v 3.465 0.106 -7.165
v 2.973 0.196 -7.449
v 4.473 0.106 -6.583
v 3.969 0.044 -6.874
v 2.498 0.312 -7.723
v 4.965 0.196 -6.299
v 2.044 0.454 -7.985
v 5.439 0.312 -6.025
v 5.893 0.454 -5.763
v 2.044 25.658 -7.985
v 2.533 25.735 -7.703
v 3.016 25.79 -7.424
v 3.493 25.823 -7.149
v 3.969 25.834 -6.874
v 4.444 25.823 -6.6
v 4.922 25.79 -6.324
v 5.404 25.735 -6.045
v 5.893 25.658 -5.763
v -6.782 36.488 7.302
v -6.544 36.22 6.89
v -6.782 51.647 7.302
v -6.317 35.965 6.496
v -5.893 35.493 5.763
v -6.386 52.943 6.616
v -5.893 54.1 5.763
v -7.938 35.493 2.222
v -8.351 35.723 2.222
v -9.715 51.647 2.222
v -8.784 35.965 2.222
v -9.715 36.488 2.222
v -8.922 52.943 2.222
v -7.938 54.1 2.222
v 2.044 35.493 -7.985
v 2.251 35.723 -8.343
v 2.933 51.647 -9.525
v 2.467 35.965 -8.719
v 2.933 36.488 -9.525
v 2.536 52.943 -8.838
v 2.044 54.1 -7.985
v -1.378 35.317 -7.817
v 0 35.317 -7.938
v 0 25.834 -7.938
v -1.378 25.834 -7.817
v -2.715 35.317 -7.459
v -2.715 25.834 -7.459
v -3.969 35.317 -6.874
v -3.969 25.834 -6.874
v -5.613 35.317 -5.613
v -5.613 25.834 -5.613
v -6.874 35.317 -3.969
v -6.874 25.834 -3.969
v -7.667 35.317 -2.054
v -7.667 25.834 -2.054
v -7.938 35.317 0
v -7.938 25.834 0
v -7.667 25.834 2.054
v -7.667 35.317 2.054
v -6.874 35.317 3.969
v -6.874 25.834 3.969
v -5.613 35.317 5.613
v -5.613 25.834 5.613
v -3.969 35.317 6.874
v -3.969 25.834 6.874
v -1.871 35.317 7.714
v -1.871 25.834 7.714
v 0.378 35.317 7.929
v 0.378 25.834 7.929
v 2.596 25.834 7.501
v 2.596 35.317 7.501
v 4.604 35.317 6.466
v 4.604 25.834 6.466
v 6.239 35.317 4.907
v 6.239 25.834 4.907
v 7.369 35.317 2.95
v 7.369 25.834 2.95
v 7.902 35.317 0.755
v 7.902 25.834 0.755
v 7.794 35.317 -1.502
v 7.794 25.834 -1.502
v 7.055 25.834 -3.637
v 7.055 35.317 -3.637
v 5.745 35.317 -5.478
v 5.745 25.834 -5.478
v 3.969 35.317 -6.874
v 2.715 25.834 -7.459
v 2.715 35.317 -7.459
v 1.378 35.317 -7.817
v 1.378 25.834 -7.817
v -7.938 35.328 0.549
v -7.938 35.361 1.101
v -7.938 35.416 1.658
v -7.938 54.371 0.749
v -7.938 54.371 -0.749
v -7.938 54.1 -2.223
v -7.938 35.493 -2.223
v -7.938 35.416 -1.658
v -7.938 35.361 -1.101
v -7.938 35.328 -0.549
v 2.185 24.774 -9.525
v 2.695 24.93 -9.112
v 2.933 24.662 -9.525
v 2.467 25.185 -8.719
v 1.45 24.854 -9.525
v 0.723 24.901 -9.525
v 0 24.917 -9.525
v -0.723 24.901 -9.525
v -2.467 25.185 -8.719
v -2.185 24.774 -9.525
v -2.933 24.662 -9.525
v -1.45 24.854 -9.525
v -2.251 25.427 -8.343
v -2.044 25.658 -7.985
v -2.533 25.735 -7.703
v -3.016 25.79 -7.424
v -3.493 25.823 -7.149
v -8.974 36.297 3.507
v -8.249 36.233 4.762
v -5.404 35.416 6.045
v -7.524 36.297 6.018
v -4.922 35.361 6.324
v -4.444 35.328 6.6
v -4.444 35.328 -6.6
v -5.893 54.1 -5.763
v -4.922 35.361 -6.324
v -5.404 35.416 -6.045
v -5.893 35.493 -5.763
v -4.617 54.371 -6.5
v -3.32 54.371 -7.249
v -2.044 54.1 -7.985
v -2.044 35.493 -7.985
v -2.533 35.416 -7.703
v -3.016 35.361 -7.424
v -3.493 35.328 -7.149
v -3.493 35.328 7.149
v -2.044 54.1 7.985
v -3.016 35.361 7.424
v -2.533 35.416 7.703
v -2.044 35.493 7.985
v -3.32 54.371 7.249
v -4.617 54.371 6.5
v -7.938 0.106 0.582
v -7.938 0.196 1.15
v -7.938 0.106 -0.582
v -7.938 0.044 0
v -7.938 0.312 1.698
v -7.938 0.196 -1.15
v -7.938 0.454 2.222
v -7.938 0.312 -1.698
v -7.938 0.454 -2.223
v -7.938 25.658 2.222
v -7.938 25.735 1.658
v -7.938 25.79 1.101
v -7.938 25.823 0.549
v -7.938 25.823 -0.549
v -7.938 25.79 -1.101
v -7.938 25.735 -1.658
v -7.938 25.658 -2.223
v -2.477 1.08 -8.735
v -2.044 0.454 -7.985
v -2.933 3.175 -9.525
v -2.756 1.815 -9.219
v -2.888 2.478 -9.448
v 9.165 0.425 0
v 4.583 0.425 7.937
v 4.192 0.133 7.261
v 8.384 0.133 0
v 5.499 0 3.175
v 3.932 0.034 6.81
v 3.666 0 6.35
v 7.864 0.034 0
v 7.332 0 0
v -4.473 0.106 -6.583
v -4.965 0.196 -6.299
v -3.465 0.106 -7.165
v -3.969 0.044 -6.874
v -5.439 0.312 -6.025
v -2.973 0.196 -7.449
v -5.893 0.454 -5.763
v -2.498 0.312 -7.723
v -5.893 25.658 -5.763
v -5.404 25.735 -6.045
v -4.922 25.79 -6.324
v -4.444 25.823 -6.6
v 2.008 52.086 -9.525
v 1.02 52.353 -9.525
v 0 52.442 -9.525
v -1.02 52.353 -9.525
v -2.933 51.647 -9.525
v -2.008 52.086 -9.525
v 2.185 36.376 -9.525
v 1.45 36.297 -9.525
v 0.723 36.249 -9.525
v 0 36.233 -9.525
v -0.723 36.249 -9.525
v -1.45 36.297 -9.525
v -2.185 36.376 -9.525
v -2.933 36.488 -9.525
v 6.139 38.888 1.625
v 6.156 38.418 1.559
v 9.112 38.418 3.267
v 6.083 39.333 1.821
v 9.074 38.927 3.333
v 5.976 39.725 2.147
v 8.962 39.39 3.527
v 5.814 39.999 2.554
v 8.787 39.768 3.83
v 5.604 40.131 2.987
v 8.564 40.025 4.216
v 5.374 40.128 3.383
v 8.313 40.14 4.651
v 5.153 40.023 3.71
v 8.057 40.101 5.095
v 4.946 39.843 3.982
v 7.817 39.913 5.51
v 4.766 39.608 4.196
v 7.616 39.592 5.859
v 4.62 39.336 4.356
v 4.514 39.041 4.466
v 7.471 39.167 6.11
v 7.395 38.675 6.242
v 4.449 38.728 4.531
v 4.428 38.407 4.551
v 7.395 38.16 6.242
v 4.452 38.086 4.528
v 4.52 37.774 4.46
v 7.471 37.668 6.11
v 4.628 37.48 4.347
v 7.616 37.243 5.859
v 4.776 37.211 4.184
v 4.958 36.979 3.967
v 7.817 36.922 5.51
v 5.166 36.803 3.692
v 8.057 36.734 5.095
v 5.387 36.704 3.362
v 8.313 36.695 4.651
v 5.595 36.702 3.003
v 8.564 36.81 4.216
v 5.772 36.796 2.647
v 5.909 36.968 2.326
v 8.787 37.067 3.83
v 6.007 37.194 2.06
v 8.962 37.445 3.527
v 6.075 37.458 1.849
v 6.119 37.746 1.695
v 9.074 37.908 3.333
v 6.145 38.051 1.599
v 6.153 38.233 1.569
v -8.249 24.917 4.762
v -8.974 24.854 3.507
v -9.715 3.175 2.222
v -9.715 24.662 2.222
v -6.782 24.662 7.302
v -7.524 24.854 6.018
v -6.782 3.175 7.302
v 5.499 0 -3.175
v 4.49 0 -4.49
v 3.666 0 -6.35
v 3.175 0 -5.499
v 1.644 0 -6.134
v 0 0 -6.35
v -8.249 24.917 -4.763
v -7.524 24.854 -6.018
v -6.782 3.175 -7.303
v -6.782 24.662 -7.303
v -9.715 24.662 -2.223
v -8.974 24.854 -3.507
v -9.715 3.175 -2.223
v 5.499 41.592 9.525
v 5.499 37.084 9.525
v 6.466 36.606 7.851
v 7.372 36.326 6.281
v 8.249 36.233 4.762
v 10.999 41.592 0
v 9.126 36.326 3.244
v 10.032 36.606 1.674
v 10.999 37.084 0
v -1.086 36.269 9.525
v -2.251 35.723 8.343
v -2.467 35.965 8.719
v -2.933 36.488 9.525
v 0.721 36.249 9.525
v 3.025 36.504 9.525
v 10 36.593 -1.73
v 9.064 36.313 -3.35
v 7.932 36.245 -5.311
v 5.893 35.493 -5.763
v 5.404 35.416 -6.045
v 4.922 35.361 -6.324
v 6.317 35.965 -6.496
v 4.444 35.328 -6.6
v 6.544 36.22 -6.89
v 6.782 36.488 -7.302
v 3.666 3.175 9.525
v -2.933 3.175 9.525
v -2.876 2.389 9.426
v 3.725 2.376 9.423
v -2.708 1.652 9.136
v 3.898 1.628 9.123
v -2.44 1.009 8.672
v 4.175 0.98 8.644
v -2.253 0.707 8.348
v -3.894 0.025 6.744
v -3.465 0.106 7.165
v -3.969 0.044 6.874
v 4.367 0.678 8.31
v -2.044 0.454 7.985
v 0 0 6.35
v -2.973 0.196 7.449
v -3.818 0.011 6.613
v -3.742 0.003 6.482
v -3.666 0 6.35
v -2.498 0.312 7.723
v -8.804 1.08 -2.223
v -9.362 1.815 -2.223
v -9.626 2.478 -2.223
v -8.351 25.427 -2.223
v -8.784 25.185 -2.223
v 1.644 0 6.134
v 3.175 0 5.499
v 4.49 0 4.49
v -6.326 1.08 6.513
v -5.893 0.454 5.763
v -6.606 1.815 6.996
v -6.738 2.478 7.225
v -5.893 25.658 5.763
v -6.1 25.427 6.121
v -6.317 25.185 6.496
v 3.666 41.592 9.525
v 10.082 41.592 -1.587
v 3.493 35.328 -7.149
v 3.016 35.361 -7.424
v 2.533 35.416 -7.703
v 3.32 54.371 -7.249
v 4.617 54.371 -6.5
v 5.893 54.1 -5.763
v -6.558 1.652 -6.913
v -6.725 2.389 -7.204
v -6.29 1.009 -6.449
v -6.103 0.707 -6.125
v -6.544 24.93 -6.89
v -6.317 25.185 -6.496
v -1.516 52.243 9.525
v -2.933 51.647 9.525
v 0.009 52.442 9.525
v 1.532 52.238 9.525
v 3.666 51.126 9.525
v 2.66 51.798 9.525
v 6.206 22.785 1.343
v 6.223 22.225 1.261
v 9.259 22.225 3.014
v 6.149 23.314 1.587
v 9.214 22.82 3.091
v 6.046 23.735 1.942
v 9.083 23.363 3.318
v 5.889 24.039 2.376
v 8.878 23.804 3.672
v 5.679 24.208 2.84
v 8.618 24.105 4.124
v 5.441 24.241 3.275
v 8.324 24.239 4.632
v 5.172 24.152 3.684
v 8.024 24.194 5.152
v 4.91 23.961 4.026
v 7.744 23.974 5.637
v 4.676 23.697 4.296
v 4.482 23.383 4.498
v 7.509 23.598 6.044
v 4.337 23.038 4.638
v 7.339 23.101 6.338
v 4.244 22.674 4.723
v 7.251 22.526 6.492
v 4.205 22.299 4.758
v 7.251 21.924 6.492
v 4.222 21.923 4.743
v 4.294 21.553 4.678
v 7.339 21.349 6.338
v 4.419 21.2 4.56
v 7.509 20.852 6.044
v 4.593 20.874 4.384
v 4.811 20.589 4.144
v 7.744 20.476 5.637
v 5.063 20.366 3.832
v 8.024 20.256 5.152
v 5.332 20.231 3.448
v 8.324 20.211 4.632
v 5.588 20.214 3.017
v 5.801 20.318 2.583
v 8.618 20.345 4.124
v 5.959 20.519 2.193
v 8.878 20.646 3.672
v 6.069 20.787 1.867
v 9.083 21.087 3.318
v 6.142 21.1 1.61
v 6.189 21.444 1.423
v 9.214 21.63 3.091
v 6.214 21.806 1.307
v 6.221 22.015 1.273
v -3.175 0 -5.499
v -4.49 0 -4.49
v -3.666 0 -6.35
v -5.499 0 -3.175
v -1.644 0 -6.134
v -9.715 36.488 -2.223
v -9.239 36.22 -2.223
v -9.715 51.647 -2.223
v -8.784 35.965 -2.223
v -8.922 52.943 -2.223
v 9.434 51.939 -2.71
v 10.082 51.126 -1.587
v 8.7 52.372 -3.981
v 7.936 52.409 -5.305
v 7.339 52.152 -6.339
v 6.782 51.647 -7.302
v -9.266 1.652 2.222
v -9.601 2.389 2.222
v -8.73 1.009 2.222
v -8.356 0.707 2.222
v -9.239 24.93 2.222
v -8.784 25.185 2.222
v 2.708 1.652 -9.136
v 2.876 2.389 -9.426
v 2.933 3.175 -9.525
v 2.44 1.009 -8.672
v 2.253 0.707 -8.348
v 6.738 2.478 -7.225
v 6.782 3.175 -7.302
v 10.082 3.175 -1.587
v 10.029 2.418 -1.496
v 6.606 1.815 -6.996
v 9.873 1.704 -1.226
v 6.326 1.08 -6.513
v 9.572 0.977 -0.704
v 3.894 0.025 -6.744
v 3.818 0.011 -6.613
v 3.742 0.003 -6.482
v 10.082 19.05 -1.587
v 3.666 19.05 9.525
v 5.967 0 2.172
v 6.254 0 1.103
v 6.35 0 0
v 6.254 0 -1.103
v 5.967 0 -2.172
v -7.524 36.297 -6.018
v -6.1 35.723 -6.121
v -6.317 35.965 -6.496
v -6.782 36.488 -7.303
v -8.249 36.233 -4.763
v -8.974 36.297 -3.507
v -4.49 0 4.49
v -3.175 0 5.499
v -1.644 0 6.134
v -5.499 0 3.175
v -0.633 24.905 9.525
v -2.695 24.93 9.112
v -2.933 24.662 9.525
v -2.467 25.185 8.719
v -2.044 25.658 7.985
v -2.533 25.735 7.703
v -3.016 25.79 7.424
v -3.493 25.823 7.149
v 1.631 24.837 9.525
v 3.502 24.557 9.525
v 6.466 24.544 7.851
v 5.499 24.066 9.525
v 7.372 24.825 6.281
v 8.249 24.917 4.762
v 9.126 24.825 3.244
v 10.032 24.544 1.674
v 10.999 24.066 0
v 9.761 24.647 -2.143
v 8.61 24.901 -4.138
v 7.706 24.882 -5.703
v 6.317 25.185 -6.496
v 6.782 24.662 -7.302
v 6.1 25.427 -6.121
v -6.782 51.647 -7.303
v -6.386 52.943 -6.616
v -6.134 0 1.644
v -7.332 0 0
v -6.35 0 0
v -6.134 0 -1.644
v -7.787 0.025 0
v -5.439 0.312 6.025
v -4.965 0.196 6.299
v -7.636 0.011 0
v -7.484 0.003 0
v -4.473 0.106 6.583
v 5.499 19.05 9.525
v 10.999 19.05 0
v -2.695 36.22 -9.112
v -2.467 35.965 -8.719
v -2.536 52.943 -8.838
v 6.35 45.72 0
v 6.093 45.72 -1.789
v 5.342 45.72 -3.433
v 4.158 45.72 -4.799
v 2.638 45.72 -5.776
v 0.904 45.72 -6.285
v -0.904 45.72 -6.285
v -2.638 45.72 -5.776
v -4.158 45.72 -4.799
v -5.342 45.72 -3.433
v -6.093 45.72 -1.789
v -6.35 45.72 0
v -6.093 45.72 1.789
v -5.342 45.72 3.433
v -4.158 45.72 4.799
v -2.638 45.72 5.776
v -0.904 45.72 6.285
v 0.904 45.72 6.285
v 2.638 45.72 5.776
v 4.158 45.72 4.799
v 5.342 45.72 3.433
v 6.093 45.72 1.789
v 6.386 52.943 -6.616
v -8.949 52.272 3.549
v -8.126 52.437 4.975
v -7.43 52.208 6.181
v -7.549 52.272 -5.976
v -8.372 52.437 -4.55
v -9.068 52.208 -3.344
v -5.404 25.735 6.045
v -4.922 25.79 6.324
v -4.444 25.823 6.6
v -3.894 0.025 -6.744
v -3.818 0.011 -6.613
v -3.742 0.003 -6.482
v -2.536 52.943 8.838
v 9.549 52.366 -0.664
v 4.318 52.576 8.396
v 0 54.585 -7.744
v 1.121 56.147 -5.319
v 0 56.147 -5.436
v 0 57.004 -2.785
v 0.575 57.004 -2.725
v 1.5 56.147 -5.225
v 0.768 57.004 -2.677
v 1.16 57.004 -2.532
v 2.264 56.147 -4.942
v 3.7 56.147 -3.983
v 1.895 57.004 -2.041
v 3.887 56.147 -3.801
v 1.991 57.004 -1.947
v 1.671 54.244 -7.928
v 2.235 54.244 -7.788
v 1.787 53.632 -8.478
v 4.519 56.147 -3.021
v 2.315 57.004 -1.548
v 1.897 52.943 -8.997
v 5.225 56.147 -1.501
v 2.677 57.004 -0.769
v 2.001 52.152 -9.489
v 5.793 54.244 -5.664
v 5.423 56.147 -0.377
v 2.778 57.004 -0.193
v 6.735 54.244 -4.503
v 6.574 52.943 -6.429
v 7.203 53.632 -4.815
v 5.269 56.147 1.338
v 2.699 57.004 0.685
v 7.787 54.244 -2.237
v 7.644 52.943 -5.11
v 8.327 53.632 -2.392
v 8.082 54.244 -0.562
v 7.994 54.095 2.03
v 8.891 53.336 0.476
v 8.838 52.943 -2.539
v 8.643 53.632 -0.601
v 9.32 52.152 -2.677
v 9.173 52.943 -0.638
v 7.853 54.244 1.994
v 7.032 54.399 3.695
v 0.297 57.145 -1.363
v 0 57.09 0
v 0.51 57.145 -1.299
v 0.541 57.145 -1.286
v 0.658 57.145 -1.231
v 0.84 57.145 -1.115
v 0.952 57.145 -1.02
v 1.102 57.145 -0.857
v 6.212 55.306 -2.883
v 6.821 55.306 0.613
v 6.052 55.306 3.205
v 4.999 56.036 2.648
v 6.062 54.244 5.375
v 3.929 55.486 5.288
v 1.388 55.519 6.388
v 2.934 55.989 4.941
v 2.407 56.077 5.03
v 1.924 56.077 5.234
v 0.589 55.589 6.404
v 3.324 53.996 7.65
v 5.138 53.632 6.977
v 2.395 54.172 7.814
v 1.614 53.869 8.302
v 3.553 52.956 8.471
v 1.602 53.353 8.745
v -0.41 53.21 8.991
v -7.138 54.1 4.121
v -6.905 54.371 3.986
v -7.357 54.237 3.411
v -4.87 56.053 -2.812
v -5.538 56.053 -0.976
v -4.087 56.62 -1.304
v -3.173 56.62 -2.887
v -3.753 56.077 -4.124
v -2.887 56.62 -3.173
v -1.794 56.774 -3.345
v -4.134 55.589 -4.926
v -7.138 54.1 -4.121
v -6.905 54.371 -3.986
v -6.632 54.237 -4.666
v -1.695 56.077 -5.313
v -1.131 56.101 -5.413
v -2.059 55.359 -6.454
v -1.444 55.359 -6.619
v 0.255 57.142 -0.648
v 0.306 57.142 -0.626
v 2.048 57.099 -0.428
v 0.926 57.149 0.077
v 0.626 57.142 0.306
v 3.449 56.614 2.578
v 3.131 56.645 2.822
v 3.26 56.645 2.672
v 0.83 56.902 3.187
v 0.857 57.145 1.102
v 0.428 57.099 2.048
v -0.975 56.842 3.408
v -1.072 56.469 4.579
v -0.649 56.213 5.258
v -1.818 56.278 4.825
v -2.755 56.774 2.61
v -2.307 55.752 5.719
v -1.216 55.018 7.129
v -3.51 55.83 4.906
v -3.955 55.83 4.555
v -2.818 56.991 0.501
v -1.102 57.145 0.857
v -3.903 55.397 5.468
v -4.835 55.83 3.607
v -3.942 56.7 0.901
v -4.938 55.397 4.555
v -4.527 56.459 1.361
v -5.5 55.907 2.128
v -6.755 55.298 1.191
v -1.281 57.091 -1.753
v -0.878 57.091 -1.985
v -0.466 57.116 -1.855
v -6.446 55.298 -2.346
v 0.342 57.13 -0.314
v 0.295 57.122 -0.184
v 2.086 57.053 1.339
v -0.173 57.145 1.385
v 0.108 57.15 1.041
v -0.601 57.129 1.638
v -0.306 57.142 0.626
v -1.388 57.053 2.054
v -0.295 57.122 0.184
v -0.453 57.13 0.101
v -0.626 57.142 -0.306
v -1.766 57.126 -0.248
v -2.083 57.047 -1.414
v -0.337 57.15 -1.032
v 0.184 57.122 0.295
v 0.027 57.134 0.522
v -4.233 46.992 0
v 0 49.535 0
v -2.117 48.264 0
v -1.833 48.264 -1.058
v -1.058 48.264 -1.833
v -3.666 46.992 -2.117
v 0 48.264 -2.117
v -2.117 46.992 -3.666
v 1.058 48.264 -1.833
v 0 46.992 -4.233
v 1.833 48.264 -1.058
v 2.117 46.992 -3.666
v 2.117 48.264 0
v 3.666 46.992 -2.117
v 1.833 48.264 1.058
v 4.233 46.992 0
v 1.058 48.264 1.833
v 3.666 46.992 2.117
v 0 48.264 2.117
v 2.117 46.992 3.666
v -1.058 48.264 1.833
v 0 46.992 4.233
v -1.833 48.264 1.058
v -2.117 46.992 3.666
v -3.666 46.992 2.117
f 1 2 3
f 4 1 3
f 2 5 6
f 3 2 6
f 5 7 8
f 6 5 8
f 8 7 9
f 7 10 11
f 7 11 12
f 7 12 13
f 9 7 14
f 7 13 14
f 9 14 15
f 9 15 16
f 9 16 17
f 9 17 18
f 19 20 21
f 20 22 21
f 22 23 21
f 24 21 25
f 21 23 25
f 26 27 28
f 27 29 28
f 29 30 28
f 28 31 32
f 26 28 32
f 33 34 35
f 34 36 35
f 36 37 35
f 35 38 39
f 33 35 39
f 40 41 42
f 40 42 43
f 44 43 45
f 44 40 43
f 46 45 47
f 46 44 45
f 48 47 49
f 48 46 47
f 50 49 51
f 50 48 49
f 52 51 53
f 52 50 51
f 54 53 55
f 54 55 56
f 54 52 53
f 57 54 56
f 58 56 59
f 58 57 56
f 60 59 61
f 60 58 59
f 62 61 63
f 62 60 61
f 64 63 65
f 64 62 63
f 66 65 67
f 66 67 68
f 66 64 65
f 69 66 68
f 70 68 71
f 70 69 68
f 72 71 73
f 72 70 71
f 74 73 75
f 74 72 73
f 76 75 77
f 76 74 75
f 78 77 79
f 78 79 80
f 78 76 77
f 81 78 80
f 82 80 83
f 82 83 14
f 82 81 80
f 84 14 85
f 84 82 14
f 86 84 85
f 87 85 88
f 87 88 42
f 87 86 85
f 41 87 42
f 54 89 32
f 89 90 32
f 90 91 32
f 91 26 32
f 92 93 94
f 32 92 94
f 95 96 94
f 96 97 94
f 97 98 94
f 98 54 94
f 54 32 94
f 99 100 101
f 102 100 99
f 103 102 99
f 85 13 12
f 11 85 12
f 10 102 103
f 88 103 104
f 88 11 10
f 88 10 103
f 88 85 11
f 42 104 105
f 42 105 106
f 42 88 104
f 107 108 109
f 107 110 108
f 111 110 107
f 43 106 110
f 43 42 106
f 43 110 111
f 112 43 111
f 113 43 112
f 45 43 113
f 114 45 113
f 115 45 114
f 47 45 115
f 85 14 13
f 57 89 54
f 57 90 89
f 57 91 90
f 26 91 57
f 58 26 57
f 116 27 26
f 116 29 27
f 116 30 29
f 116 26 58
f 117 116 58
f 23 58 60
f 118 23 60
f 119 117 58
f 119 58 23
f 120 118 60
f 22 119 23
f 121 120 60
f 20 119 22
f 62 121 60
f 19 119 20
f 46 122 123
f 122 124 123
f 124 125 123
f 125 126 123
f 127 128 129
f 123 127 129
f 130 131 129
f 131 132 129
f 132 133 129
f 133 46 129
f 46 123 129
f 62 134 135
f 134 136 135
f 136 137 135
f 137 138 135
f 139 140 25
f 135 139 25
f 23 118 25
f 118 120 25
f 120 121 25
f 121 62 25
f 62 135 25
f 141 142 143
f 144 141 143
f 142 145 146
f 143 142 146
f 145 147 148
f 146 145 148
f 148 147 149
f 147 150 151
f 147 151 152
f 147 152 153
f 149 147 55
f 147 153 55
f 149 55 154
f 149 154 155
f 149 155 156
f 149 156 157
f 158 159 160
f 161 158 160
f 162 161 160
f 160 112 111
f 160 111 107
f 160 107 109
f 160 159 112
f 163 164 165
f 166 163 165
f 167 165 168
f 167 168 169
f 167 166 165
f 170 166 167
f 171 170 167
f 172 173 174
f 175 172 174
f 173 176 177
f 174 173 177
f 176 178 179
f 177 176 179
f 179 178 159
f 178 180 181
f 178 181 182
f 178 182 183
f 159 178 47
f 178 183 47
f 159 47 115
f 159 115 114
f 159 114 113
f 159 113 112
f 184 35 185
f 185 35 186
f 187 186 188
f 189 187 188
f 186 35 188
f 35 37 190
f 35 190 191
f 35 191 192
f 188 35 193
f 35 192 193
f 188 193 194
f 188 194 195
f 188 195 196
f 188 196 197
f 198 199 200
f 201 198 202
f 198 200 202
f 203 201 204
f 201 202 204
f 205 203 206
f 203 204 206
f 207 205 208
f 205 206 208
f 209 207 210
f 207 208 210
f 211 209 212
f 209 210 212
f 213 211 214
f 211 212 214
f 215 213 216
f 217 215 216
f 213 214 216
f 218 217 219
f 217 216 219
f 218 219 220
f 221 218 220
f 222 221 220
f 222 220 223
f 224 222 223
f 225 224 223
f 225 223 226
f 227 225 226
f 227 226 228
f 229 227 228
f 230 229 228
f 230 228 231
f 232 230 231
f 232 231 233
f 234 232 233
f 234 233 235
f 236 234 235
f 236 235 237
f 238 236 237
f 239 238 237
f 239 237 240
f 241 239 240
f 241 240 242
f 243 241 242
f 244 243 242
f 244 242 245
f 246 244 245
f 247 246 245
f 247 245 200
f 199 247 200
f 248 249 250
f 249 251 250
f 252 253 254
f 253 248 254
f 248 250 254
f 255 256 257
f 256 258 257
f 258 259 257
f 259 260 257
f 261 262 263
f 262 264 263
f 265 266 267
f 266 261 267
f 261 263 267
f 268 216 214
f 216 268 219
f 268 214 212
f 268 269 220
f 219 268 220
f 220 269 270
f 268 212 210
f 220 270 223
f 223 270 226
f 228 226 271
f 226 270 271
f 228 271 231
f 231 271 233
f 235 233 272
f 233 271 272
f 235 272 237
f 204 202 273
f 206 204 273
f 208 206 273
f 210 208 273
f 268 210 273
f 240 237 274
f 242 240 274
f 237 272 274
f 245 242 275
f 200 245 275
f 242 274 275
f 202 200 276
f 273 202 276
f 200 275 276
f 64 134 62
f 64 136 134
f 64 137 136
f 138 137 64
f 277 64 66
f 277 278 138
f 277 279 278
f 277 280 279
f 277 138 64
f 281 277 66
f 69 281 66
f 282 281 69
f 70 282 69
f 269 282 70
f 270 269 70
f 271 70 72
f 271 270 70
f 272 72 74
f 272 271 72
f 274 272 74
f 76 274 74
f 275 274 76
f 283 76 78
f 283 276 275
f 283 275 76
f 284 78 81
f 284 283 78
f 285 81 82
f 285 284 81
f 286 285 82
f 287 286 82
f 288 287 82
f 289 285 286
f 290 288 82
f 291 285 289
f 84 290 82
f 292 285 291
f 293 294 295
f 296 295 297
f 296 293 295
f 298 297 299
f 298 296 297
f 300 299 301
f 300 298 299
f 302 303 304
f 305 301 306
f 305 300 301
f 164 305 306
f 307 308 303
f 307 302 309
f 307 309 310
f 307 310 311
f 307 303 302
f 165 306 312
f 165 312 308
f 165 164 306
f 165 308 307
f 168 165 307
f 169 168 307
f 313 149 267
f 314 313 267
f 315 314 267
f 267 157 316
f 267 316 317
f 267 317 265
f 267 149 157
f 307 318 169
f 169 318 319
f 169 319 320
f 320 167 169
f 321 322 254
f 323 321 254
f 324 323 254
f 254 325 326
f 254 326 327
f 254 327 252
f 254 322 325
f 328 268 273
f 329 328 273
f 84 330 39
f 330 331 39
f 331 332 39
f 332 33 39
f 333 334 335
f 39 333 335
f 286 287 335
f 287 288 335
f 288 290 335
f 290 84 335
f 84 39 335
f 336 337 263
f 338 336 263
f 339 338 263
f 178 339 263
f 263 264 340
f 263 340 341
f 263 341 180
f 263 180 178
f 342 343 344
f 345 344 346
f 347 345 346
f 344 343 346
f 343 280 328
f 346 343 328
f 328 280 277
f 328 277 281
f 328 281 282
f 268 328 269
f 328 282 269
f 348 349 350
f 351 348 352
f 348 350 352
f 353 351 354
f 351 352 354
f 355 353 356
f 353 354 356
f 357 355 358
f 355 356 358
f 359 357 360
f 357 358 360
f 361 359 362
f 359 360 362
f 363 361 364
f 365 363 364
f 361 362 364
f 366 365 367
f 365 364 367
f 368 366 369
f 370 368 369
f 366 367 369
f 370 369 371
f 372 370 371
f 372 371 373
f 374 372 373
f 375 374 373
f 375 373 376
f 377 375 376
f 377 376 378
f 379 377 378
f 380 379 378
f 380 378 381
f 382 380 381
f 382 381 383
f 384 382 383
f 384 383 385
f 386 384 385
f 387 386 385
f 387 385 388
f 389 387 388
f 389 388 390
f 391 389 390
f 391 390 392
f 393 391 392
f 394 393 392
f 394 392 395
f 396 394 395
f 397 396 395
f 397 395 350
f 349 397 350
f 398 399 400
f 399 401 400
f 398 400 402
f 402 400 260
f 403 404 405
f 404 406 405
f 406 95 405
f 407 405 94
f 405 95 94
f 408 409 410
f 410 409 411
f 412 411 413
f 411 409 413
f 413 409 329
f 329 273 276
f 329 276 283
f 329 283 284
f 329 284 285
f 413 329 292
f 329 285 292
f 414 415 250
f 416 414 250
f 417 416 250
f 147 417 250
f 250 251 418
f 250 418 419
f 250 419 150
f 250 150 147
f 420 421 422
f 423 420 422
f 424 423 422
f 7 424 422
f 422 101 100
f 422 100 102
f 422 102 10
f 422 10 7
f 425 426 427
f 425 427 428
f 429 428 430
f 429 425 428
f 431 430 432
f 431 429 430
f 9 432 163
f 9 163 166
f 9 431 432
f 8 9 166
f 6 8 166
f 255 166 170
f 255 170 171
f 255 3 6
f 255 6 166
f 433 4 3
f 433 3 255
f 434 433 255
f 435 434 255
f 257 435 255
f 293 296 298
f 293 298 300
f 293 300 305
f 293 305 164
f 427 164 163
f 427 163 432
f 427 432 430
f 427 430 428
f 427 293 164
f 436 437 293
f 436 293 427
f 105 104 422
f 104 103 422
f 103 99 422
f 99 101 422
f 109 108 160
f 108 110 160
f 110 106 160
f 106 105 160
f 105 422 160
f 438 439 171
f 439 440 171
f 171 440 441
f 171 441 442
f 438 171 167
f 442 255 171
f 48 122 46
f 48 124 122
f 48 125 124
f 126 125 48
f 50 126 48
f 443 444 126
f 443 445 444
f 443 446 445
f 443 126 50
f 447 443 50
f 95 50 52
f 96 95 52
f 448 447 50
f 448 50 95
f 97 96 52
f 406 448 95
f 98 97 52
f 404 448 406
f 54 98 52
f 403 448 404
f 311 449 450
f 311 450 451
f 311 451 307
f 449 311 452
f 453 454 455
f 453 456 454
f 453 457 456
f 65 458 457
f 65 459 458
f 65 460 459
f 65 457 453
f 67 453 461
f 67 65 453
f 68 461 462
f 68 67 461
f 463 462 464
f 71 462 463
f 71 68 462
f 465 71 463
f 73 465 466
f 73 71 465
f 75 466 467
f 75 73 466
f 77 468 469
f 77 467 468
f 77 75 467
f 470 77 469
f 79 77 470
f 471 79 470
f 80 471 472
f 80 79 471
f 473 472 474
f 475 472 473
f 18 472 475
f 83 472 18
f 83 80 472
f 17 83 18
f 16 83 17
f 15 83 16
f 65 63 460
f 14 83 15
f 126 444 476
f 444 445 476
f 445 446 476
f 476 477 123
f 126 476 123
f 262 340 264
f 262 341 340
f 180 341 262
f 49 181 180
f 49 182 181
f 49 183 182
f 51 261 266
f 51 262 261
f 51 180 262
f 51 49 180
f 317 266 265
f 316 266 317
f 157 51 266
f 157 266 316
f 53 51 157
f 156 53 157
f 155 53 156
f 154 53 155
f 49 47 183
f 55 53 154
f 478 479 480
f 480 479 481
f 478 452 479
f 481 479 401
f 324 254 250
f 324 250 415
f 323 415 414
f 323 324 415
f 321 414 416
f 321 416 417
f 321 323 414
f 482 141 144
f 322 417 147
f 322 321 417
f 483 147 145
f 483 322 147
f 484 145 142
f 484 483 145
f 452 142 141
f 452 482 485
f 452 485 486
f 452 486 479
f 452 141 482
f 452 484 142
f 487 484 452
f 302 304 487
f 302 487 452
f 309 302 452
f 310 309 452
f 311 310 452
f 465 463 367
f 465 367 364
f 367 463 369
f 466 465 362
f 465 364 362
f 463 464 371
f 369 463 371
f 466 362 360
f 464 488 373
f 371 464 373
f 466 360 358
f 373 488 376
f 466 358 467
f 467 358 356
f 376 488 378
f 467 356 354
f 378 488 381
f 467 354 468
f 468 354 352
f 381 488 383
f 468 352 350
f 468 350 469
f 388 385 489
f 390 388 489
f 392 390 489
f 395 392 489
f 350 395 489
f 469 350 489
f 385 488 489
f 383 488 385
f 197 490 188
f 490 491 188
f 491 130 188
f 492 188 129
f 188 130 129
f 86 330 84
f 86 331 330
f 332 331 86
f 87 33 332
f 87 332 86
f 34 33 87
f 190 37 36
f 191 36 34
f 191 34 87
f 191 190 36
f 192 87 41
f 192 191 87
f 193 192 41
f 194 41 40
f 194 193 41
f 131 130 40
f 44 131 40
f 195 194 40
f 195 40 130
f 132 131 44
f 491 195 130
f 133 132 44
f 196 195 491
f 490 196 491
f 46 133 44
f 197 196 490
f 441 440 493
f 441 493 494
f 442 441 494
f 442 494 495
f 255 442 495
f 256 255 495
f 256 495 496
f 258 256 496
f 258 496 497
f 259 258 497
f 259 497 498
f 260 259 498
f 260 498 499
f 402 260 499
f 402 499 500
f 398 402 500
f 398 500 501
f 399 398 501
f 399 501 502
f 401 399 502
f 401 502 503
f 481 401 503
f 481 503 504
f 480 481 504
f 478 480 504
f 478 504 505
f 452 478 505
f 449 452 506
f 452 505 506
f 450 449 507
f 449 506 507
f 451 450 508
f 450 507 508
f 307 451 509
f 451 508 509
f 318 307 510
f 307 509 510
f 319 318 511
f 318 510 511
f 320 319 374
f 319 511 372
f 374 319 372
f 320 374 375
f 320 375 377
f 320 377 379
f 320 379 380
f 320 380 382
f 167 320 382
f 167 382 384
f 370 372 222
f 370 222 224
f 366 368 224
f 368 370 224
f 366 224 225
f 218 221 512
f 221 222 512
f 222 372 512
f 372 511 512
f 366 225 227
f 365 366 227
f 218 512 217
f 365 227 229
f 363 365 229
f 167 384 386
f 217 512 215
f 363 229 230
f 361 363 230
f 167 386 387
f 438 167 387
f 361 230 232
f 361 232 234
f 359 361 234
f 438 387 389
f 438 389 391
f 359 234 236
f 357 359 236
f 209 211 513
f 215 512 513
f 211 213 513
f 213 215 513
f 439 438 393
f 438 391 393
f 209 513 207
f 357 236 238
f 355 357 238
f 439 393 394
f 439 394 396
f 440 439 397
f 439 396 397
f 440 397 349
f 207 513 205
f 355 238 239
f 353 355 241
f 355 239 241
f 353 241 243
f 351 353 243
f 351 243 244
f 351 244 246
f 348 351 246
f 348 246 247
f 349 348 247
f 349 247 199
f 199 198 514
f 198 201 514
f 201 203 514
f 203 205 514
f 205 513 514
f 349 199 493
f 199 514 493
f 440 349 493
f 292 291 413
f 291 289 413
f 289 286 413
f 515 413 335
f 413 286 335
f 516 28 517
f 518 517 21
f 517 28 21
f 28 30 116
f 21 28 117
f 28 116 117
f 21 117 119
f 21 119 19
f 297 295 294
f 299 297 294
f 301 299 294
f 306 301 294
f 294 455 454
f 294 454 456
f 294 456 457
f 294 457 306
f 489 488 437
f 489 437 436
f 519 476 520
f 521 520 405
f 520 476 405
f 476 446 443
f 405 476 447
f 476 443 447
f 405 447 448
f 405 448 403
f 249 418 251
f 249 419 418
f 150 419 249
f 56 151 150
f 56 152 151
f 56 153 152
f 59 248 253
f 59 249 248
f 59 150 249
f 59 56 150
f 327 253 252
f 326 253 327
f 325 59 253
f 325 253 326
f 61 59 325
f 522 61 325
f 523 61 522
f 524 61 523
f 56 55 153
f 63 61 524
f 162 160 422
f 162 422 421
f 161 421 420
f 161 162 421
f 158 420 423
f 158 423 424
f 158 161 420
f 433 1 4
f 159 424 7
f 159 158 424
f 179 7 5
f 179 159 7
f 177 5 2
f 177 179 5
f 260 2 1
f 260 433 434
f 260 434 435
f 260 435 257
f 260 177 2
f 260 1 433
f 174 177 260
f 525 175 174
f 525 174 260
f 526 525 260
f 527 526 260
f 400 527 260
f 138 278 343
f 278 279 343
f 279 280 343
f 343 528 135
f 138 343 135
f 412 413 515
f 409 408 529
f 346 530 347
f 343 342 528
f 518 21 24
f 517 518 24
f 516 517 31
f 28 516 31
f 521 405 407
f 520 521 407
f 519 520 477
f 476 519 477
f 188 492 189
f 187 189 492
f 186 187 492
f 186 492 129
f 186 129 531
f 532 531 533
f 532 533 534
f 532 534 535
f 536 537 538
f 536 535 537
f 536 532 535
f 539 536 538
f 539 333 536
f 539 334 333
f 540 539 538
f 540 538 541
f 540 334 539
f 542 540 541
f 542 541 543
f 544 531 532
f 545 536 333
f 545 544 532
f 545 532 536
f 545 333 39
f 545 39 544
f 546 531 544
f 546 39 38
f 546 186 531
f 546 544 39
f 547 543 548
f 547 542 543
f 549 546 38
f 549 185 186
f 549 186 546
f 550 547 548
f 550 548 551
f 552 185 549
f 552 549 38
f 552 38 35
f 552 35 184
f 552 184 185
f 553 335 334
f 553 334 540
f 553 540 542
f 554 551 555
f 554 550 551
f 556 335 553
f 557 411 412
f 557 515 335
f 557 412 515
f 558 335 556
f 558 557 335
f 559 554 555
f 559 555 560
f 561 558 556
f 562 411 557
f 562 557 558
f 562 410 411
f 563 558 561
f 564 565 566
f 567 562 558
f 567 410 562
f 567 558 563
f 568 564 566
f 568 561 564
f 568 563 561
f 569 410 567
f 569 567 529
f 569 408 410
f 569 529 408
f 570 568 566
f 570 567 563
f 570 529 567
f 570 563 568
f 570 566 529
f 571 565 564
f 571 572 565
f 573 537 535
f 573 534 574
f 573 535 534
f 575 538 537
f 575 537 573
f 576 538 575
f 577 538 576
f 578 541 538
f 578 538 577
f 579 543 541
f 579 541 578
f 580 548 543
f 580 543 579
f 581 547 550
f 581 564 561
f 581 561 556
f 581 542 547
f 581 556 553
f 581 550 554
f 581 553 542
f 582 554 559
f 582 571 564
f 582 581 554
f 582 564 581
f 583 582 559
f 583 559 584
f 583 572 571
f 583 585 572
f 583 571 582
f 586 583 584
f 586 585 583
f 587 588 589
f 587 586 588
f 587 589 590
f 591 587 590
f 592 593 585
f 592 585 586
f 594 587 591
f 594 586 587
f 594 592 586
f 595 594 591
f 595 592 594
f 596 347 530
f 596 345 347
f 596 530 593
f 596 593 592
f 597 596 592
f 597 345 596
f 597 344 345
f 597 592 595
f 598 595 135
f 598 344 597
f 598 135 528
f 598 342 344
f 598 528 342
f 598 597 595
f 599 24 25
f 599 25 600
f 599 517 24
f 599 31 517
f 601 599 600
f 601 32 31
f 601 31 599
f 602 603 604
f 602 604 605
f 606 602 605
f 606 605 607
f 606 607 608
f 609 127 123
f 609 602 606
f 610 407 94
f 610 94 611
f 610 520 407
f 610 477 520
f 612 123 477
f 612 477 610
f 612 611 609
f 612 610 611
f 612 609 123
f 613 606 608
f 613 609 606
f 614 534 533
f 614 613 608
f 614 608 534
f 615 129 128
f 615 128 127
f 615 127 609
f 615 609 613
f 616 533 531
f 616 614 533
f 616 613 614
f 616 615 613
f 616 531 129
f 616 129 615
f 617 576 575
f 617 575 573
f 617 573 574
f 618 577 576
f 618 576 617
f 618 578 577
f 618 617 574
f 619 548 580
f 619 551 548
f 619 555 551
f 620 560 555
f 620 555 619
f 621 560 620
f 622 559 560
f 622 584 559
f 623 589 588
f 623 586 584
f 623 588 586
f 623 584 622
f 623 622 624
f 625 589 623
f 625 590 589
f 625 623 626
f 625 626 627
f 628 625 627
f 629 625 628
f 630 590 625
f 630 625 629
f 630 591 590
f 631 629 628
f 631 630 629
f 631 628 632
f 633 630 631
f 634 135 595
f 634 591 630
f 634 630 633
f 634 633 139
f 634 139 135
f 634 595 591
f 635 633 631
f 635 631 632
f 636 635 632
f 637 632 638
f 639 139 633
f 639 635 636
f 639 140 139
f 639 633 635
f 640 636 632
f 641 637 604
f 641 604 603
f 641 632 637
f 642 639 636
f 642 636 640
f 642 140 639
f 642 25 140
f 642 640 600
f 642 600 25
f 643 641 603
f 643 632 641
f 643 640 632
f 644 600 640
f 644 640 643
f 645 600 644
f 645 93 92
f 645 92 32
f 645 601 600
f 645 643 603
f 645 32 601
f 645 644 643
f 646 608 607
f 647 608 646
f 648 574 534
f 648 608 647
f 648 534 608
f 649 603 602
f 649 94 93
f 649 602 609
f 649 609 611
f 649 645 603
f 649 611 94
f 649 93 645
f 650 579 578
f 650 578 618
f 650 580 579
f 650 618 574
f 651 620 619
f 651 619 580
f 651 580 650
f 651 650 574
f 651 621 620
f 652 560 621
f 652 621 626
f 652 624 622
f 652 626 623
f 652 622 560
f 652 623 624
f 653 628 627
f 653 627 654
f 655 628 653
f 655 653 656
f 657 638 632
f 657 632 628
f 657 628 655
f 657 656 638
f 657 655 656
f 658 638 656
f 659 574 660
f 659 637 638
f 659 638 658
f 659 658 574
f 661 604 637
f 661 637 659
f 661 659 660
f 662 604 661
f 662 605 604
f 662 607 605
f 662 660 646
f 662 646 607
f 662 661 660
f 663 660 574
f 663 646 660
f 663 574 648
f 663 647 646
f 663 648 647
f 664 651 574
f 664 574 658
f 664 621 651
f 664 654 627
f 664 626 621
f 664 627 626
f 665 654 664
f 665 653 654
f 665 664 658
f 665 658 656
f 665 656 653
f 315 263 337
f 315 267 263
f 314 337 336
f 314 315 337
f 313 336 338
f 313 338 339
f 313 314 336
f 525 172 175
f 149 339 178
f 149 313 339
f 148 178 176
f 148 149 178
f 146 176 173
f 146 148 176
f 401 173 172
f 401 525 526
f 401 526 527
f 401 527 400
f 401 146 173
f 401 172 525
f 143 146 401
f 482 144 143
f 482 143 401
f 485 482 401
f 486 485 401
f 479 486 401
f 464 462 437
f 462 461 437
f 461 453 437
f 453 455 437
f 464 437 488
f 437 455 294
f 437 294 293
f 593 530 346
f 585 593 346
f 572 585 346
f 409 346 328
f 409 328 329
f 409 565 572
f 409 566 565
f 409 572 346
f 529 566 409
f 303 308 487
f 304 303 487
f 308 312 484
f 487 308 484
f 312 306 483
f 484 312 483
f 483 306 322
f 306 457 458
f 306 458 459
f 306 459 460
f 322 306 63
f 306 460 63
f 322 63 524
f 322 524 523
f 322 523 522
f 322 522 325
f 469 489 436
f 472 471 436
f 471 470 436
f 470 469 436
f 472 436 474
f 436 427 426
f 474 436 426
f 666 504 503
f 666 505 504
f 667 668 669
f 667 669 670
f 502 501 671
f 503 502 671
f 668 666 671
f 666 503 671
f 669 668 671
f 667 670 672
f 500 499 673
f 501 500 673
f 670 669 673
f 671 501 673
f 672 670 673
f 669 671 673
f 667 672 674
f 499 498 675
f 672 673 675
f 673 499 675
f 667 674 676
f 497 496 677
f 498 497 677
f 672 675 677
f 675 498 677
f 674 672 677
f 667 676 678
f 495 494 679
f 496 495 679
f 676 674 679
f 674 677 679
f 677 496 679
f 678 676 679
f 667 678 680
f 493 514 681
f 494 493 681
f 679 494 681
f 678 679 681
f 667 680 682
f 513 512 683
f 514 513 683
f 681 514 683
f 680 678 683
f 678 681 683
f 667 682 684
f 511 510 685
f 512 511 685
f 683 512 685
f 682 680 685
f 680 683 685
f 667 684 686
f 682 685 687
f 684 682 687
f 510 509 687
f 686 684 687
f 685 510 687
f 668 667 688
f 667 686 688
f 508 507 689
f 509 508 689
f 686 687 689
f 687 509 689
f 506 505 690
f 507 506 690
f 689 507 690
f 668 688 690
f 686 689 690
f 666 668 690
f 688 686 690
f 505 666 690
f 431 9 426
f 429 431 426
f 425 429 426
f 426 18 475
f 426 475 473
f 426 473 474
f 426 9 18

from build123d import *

# Parameters (mm, degrees)
BOSS_EXTRUDE1_DEPTH              = 57.15
FILLET1_R                        = 3.175
F_1_2_0_5_DIAMETER_HOLE1_D       = 12.7
F_1_2_0_5_DIAMETER_HOLE1_DEPTH   = 45.72
F_1_2_0_5_DIAMETER_HOLE1_TIP     = 3.815464931
F_10_32_TAPPED_HOLE1_REACH       = 63.974
F_10_32_TAPPED_HOLE1_BORE_R      = 2.0193
F_29_0_136_DIAMETER_HOLE1_REACH  = 63.974
F_29_0_136_DIAMETER_HOLE1_BORE_R = 1.7272
CUT_EXTRUDE1_DEPTH               = 59.973007694
CIRPATTERN1_COUNT                = 6
SKETCH16_W                       = 25.4
SKETCH16_H                       = 25.4
CUT_EXTRUDE2_DEPTH               = 1.5875


with BuildPart() as part:
    # Sketch1 → Boss-Extrude1 (new body)
    with BuildSketch(Plane(origin=(0, 0, 0), x_dir=(1, 0, 0), z_dir=(0, 1, 0))):
        Polygon((10.998522628, 0), (5.499261314, 9.525), (-5.499261314, 9.525), (-10.998522628, 0), (-5.499261314, -9.525), (5.499261314, -9.525), align=None)
    extrude(amount=BOSS_EXTRUDE1_DEPTH)

    # Fillet1
    fillet1_edges = [part.edges().sort_by_distance(p)[0] for p in [
        (0, 0, 9.525),
        (-8.248891971, 0, 4.7625),
        (-8.248891971, 0, -4.7625),
        (0, 0, -9.525),
        (8.248891971, 0, -4.7625),
        (8.248891971, 0, 4.7625),
    ]]
    fillet(fillet1_edges, radius=FILLET1_R)

    # 1/2 (0.5) Diameter Hole1
    with Locations(Plane(origin=(0, 0, 0), x_dir=(-1, 0, 0), z_dir=(0, -1, 0))):
        with Locations((0, 0)):
            Hole(F_1_2_0_5_DIAMETER_HOLE1_D / 2, depth=F_1_2_0_5_DIAMETER_HOLE1_DEPTH)
            with Locations((0, 0, -(F_1_2_0_5_DIAMETER_HOLE1_DEPTH + F_1_2_0_5_DIAMETER_HOLE1_TIP / 2))):  # 118° drill point
                Cone(0, F_1_2_0_5_DIAMETER_HOLE1_D / 2, F_1_2_0_5_DIAMETER_HOLE1_TIP, mode=Mode.SUBTRACT)

    # #10-32 Tapped Hole1 bore → #10-32 Tapped Hole1 (cut, up to next)
    with BuildSketch(Plane(origin=(8.248891971, 0, 4.7625), x_dir=(0.49999999999999845, 0, -0.8660254037844396), z_dir=(0.8660254037844395, 0, 0.4999999999999984)), mode=Mode.PRIVATE) as f_10_32_tapped_hole1_sk1:
        with Locations((0, 22.225)):
            Circle(F_10_32_TAPPED_HOLE1_BORE_R)
    f_10_32_tapped_hole1_tool1 = extrude(f_10_32_tapped_hole1_sk1.sketch, amount=-F_10_32_TAPPED_HOLE1_REACH, mode=Mode.PRIVATE) & part.part
    add(f_10_32_tapped_hole1_tool1.solids().sort_by_distance((8.248892, 22.225, 4.7625))[0], mode=Mode.SUBTRACT)

    # #29 (0.136) Diameter Hole1 bore → #29 (0.136) Diameter Hole1 (cut, up to next)
    with BuildSketch(Plane(origin=(8.248891971, 0, 4.7625), x_dir=(0.49999999999999845, 0, -0.8660254037844396), z_dir=(0.8660254037844395, 0, 0.4999999999999984)), mode=Mode.PRIVATE) as f_29_0_136_diameter_hole1_sk1:
        with Locations((0, 38.4175)):
            Circle(F_29_0_136_DIAMETER_HOLE1_BORE_R)
    f_29_0_136_diameter_hole1_tool1 = extrude(f_29_0_136_diameter_hole1_sk1.sketch, amount=-F_29_0_136_DIAMETER_HOLE1_REACH, mode=Mode.PRIVATE) & part.part
    add(f_29_0_136_diameter_hole1_tool1.solids().sort_by_distance((8.248892, 38.4175, 4.7625))[0], mode=Mode.SUBTRACT)

    # Sketch13 → Cut-Extrude1 (cut, through all)
    with BuildSketch(Plane(origin=(0, 57.15, 0), x_dir=(1, 0, 0), z_dir=(0, 1, 0))):
        Polygon((-9.06849146, 11.262087957), (-5.89349146, 5.762826643), (-2.04400854, 7.985326643), (-5.21900854, 13.484587957), align=None)
    cut_extrude1 = extrude(amount=-CUT_EXTRUDE1_DEPTH, mode=Mode.SUBTRACT)

    # CirPattern1: Cut-Extrude1 ×6 about axis, 2 skipped
    cirpattern1_axis = Axis((0, 0, 0), (0, -1, 0))
    add([cut_extrude1.rotate(cirpattern1_axis, i * 360 / CIRPATTERN1_COUNT) for i in range(1, CIRPATTERN1_COUNT) if i not in (2, 3)], mode=Mode.SUBTRACT)

    # Sketch15 → Cut-Revolve4 (revolve, cut)
    with BuildSketch(Plane.XY, mode=Mode.PRIVATE) as cut_revolve4_sk:
        with BuildLine():
            Line((-10.998522628, 47.244), (-21.751479805, 47.244))
            Line((-21.751479805, 47.244), (-21.751479805, 61.468889452))
            Line((-21.751479805, 61.468889452), (0, 61.468889452))
            Line((0, 61.468889452), (0, 57.08956907))
            ThreePointArc((0, 57.08956907), (-7.699575937, 54.624764363), (-10.998522628, 47.244))
        make_face()
    revolve(cut_revolve4_sk.sketch.rotate(Axis((0, 61.468889452, 0), (0, -1, 0)), 90), axis=Axis((0, 61.468889452, 0), (0, -1, 0)), mode=Mode.SUBTRACT)

    # Sketch12 → Cut-Revolve6 (revolve, cut)
    with BuildSketch(Plane.XY, mode=Mode.PRIVATE) as cut_revolve6_sk:
        Polygon((7.9375, 35.316717762), (10.998522628, 37.084), (10.998522628, 24.0665), (7.9375, 25.833782238), align=None)
    revolve(cut_revolve6_sk.sketch.rotate(Axis((0, 0, 0), (0, 1, 0)), 90), axis=Axis((0, 0, 0), (0, 1, 0)), mode=Mode.SUBTRACT)

    # Sketch16 → Cut-Extrude2 (cut)
    with BuildSketch(Plane(origin=(8.248891971, 0, 4.7625), x_dir=(0.49999999999999845, 0, -0.8660254037844396), z_dir=(0.8660254037844395, 0, 0.4999999999999984))):
        with Locations((0, 54.2925)):
            Rectangle(SKETCH16_W, SKETCH16_H)
        with Locations((0, 6.35)):
            Rectangle(SKETCH16_W, SKETCH16_H)
    extrude(amount=-CUT_EXTRUDE2_DEPTH, mode=Mode.SUBTRACT)


solid = part.part
